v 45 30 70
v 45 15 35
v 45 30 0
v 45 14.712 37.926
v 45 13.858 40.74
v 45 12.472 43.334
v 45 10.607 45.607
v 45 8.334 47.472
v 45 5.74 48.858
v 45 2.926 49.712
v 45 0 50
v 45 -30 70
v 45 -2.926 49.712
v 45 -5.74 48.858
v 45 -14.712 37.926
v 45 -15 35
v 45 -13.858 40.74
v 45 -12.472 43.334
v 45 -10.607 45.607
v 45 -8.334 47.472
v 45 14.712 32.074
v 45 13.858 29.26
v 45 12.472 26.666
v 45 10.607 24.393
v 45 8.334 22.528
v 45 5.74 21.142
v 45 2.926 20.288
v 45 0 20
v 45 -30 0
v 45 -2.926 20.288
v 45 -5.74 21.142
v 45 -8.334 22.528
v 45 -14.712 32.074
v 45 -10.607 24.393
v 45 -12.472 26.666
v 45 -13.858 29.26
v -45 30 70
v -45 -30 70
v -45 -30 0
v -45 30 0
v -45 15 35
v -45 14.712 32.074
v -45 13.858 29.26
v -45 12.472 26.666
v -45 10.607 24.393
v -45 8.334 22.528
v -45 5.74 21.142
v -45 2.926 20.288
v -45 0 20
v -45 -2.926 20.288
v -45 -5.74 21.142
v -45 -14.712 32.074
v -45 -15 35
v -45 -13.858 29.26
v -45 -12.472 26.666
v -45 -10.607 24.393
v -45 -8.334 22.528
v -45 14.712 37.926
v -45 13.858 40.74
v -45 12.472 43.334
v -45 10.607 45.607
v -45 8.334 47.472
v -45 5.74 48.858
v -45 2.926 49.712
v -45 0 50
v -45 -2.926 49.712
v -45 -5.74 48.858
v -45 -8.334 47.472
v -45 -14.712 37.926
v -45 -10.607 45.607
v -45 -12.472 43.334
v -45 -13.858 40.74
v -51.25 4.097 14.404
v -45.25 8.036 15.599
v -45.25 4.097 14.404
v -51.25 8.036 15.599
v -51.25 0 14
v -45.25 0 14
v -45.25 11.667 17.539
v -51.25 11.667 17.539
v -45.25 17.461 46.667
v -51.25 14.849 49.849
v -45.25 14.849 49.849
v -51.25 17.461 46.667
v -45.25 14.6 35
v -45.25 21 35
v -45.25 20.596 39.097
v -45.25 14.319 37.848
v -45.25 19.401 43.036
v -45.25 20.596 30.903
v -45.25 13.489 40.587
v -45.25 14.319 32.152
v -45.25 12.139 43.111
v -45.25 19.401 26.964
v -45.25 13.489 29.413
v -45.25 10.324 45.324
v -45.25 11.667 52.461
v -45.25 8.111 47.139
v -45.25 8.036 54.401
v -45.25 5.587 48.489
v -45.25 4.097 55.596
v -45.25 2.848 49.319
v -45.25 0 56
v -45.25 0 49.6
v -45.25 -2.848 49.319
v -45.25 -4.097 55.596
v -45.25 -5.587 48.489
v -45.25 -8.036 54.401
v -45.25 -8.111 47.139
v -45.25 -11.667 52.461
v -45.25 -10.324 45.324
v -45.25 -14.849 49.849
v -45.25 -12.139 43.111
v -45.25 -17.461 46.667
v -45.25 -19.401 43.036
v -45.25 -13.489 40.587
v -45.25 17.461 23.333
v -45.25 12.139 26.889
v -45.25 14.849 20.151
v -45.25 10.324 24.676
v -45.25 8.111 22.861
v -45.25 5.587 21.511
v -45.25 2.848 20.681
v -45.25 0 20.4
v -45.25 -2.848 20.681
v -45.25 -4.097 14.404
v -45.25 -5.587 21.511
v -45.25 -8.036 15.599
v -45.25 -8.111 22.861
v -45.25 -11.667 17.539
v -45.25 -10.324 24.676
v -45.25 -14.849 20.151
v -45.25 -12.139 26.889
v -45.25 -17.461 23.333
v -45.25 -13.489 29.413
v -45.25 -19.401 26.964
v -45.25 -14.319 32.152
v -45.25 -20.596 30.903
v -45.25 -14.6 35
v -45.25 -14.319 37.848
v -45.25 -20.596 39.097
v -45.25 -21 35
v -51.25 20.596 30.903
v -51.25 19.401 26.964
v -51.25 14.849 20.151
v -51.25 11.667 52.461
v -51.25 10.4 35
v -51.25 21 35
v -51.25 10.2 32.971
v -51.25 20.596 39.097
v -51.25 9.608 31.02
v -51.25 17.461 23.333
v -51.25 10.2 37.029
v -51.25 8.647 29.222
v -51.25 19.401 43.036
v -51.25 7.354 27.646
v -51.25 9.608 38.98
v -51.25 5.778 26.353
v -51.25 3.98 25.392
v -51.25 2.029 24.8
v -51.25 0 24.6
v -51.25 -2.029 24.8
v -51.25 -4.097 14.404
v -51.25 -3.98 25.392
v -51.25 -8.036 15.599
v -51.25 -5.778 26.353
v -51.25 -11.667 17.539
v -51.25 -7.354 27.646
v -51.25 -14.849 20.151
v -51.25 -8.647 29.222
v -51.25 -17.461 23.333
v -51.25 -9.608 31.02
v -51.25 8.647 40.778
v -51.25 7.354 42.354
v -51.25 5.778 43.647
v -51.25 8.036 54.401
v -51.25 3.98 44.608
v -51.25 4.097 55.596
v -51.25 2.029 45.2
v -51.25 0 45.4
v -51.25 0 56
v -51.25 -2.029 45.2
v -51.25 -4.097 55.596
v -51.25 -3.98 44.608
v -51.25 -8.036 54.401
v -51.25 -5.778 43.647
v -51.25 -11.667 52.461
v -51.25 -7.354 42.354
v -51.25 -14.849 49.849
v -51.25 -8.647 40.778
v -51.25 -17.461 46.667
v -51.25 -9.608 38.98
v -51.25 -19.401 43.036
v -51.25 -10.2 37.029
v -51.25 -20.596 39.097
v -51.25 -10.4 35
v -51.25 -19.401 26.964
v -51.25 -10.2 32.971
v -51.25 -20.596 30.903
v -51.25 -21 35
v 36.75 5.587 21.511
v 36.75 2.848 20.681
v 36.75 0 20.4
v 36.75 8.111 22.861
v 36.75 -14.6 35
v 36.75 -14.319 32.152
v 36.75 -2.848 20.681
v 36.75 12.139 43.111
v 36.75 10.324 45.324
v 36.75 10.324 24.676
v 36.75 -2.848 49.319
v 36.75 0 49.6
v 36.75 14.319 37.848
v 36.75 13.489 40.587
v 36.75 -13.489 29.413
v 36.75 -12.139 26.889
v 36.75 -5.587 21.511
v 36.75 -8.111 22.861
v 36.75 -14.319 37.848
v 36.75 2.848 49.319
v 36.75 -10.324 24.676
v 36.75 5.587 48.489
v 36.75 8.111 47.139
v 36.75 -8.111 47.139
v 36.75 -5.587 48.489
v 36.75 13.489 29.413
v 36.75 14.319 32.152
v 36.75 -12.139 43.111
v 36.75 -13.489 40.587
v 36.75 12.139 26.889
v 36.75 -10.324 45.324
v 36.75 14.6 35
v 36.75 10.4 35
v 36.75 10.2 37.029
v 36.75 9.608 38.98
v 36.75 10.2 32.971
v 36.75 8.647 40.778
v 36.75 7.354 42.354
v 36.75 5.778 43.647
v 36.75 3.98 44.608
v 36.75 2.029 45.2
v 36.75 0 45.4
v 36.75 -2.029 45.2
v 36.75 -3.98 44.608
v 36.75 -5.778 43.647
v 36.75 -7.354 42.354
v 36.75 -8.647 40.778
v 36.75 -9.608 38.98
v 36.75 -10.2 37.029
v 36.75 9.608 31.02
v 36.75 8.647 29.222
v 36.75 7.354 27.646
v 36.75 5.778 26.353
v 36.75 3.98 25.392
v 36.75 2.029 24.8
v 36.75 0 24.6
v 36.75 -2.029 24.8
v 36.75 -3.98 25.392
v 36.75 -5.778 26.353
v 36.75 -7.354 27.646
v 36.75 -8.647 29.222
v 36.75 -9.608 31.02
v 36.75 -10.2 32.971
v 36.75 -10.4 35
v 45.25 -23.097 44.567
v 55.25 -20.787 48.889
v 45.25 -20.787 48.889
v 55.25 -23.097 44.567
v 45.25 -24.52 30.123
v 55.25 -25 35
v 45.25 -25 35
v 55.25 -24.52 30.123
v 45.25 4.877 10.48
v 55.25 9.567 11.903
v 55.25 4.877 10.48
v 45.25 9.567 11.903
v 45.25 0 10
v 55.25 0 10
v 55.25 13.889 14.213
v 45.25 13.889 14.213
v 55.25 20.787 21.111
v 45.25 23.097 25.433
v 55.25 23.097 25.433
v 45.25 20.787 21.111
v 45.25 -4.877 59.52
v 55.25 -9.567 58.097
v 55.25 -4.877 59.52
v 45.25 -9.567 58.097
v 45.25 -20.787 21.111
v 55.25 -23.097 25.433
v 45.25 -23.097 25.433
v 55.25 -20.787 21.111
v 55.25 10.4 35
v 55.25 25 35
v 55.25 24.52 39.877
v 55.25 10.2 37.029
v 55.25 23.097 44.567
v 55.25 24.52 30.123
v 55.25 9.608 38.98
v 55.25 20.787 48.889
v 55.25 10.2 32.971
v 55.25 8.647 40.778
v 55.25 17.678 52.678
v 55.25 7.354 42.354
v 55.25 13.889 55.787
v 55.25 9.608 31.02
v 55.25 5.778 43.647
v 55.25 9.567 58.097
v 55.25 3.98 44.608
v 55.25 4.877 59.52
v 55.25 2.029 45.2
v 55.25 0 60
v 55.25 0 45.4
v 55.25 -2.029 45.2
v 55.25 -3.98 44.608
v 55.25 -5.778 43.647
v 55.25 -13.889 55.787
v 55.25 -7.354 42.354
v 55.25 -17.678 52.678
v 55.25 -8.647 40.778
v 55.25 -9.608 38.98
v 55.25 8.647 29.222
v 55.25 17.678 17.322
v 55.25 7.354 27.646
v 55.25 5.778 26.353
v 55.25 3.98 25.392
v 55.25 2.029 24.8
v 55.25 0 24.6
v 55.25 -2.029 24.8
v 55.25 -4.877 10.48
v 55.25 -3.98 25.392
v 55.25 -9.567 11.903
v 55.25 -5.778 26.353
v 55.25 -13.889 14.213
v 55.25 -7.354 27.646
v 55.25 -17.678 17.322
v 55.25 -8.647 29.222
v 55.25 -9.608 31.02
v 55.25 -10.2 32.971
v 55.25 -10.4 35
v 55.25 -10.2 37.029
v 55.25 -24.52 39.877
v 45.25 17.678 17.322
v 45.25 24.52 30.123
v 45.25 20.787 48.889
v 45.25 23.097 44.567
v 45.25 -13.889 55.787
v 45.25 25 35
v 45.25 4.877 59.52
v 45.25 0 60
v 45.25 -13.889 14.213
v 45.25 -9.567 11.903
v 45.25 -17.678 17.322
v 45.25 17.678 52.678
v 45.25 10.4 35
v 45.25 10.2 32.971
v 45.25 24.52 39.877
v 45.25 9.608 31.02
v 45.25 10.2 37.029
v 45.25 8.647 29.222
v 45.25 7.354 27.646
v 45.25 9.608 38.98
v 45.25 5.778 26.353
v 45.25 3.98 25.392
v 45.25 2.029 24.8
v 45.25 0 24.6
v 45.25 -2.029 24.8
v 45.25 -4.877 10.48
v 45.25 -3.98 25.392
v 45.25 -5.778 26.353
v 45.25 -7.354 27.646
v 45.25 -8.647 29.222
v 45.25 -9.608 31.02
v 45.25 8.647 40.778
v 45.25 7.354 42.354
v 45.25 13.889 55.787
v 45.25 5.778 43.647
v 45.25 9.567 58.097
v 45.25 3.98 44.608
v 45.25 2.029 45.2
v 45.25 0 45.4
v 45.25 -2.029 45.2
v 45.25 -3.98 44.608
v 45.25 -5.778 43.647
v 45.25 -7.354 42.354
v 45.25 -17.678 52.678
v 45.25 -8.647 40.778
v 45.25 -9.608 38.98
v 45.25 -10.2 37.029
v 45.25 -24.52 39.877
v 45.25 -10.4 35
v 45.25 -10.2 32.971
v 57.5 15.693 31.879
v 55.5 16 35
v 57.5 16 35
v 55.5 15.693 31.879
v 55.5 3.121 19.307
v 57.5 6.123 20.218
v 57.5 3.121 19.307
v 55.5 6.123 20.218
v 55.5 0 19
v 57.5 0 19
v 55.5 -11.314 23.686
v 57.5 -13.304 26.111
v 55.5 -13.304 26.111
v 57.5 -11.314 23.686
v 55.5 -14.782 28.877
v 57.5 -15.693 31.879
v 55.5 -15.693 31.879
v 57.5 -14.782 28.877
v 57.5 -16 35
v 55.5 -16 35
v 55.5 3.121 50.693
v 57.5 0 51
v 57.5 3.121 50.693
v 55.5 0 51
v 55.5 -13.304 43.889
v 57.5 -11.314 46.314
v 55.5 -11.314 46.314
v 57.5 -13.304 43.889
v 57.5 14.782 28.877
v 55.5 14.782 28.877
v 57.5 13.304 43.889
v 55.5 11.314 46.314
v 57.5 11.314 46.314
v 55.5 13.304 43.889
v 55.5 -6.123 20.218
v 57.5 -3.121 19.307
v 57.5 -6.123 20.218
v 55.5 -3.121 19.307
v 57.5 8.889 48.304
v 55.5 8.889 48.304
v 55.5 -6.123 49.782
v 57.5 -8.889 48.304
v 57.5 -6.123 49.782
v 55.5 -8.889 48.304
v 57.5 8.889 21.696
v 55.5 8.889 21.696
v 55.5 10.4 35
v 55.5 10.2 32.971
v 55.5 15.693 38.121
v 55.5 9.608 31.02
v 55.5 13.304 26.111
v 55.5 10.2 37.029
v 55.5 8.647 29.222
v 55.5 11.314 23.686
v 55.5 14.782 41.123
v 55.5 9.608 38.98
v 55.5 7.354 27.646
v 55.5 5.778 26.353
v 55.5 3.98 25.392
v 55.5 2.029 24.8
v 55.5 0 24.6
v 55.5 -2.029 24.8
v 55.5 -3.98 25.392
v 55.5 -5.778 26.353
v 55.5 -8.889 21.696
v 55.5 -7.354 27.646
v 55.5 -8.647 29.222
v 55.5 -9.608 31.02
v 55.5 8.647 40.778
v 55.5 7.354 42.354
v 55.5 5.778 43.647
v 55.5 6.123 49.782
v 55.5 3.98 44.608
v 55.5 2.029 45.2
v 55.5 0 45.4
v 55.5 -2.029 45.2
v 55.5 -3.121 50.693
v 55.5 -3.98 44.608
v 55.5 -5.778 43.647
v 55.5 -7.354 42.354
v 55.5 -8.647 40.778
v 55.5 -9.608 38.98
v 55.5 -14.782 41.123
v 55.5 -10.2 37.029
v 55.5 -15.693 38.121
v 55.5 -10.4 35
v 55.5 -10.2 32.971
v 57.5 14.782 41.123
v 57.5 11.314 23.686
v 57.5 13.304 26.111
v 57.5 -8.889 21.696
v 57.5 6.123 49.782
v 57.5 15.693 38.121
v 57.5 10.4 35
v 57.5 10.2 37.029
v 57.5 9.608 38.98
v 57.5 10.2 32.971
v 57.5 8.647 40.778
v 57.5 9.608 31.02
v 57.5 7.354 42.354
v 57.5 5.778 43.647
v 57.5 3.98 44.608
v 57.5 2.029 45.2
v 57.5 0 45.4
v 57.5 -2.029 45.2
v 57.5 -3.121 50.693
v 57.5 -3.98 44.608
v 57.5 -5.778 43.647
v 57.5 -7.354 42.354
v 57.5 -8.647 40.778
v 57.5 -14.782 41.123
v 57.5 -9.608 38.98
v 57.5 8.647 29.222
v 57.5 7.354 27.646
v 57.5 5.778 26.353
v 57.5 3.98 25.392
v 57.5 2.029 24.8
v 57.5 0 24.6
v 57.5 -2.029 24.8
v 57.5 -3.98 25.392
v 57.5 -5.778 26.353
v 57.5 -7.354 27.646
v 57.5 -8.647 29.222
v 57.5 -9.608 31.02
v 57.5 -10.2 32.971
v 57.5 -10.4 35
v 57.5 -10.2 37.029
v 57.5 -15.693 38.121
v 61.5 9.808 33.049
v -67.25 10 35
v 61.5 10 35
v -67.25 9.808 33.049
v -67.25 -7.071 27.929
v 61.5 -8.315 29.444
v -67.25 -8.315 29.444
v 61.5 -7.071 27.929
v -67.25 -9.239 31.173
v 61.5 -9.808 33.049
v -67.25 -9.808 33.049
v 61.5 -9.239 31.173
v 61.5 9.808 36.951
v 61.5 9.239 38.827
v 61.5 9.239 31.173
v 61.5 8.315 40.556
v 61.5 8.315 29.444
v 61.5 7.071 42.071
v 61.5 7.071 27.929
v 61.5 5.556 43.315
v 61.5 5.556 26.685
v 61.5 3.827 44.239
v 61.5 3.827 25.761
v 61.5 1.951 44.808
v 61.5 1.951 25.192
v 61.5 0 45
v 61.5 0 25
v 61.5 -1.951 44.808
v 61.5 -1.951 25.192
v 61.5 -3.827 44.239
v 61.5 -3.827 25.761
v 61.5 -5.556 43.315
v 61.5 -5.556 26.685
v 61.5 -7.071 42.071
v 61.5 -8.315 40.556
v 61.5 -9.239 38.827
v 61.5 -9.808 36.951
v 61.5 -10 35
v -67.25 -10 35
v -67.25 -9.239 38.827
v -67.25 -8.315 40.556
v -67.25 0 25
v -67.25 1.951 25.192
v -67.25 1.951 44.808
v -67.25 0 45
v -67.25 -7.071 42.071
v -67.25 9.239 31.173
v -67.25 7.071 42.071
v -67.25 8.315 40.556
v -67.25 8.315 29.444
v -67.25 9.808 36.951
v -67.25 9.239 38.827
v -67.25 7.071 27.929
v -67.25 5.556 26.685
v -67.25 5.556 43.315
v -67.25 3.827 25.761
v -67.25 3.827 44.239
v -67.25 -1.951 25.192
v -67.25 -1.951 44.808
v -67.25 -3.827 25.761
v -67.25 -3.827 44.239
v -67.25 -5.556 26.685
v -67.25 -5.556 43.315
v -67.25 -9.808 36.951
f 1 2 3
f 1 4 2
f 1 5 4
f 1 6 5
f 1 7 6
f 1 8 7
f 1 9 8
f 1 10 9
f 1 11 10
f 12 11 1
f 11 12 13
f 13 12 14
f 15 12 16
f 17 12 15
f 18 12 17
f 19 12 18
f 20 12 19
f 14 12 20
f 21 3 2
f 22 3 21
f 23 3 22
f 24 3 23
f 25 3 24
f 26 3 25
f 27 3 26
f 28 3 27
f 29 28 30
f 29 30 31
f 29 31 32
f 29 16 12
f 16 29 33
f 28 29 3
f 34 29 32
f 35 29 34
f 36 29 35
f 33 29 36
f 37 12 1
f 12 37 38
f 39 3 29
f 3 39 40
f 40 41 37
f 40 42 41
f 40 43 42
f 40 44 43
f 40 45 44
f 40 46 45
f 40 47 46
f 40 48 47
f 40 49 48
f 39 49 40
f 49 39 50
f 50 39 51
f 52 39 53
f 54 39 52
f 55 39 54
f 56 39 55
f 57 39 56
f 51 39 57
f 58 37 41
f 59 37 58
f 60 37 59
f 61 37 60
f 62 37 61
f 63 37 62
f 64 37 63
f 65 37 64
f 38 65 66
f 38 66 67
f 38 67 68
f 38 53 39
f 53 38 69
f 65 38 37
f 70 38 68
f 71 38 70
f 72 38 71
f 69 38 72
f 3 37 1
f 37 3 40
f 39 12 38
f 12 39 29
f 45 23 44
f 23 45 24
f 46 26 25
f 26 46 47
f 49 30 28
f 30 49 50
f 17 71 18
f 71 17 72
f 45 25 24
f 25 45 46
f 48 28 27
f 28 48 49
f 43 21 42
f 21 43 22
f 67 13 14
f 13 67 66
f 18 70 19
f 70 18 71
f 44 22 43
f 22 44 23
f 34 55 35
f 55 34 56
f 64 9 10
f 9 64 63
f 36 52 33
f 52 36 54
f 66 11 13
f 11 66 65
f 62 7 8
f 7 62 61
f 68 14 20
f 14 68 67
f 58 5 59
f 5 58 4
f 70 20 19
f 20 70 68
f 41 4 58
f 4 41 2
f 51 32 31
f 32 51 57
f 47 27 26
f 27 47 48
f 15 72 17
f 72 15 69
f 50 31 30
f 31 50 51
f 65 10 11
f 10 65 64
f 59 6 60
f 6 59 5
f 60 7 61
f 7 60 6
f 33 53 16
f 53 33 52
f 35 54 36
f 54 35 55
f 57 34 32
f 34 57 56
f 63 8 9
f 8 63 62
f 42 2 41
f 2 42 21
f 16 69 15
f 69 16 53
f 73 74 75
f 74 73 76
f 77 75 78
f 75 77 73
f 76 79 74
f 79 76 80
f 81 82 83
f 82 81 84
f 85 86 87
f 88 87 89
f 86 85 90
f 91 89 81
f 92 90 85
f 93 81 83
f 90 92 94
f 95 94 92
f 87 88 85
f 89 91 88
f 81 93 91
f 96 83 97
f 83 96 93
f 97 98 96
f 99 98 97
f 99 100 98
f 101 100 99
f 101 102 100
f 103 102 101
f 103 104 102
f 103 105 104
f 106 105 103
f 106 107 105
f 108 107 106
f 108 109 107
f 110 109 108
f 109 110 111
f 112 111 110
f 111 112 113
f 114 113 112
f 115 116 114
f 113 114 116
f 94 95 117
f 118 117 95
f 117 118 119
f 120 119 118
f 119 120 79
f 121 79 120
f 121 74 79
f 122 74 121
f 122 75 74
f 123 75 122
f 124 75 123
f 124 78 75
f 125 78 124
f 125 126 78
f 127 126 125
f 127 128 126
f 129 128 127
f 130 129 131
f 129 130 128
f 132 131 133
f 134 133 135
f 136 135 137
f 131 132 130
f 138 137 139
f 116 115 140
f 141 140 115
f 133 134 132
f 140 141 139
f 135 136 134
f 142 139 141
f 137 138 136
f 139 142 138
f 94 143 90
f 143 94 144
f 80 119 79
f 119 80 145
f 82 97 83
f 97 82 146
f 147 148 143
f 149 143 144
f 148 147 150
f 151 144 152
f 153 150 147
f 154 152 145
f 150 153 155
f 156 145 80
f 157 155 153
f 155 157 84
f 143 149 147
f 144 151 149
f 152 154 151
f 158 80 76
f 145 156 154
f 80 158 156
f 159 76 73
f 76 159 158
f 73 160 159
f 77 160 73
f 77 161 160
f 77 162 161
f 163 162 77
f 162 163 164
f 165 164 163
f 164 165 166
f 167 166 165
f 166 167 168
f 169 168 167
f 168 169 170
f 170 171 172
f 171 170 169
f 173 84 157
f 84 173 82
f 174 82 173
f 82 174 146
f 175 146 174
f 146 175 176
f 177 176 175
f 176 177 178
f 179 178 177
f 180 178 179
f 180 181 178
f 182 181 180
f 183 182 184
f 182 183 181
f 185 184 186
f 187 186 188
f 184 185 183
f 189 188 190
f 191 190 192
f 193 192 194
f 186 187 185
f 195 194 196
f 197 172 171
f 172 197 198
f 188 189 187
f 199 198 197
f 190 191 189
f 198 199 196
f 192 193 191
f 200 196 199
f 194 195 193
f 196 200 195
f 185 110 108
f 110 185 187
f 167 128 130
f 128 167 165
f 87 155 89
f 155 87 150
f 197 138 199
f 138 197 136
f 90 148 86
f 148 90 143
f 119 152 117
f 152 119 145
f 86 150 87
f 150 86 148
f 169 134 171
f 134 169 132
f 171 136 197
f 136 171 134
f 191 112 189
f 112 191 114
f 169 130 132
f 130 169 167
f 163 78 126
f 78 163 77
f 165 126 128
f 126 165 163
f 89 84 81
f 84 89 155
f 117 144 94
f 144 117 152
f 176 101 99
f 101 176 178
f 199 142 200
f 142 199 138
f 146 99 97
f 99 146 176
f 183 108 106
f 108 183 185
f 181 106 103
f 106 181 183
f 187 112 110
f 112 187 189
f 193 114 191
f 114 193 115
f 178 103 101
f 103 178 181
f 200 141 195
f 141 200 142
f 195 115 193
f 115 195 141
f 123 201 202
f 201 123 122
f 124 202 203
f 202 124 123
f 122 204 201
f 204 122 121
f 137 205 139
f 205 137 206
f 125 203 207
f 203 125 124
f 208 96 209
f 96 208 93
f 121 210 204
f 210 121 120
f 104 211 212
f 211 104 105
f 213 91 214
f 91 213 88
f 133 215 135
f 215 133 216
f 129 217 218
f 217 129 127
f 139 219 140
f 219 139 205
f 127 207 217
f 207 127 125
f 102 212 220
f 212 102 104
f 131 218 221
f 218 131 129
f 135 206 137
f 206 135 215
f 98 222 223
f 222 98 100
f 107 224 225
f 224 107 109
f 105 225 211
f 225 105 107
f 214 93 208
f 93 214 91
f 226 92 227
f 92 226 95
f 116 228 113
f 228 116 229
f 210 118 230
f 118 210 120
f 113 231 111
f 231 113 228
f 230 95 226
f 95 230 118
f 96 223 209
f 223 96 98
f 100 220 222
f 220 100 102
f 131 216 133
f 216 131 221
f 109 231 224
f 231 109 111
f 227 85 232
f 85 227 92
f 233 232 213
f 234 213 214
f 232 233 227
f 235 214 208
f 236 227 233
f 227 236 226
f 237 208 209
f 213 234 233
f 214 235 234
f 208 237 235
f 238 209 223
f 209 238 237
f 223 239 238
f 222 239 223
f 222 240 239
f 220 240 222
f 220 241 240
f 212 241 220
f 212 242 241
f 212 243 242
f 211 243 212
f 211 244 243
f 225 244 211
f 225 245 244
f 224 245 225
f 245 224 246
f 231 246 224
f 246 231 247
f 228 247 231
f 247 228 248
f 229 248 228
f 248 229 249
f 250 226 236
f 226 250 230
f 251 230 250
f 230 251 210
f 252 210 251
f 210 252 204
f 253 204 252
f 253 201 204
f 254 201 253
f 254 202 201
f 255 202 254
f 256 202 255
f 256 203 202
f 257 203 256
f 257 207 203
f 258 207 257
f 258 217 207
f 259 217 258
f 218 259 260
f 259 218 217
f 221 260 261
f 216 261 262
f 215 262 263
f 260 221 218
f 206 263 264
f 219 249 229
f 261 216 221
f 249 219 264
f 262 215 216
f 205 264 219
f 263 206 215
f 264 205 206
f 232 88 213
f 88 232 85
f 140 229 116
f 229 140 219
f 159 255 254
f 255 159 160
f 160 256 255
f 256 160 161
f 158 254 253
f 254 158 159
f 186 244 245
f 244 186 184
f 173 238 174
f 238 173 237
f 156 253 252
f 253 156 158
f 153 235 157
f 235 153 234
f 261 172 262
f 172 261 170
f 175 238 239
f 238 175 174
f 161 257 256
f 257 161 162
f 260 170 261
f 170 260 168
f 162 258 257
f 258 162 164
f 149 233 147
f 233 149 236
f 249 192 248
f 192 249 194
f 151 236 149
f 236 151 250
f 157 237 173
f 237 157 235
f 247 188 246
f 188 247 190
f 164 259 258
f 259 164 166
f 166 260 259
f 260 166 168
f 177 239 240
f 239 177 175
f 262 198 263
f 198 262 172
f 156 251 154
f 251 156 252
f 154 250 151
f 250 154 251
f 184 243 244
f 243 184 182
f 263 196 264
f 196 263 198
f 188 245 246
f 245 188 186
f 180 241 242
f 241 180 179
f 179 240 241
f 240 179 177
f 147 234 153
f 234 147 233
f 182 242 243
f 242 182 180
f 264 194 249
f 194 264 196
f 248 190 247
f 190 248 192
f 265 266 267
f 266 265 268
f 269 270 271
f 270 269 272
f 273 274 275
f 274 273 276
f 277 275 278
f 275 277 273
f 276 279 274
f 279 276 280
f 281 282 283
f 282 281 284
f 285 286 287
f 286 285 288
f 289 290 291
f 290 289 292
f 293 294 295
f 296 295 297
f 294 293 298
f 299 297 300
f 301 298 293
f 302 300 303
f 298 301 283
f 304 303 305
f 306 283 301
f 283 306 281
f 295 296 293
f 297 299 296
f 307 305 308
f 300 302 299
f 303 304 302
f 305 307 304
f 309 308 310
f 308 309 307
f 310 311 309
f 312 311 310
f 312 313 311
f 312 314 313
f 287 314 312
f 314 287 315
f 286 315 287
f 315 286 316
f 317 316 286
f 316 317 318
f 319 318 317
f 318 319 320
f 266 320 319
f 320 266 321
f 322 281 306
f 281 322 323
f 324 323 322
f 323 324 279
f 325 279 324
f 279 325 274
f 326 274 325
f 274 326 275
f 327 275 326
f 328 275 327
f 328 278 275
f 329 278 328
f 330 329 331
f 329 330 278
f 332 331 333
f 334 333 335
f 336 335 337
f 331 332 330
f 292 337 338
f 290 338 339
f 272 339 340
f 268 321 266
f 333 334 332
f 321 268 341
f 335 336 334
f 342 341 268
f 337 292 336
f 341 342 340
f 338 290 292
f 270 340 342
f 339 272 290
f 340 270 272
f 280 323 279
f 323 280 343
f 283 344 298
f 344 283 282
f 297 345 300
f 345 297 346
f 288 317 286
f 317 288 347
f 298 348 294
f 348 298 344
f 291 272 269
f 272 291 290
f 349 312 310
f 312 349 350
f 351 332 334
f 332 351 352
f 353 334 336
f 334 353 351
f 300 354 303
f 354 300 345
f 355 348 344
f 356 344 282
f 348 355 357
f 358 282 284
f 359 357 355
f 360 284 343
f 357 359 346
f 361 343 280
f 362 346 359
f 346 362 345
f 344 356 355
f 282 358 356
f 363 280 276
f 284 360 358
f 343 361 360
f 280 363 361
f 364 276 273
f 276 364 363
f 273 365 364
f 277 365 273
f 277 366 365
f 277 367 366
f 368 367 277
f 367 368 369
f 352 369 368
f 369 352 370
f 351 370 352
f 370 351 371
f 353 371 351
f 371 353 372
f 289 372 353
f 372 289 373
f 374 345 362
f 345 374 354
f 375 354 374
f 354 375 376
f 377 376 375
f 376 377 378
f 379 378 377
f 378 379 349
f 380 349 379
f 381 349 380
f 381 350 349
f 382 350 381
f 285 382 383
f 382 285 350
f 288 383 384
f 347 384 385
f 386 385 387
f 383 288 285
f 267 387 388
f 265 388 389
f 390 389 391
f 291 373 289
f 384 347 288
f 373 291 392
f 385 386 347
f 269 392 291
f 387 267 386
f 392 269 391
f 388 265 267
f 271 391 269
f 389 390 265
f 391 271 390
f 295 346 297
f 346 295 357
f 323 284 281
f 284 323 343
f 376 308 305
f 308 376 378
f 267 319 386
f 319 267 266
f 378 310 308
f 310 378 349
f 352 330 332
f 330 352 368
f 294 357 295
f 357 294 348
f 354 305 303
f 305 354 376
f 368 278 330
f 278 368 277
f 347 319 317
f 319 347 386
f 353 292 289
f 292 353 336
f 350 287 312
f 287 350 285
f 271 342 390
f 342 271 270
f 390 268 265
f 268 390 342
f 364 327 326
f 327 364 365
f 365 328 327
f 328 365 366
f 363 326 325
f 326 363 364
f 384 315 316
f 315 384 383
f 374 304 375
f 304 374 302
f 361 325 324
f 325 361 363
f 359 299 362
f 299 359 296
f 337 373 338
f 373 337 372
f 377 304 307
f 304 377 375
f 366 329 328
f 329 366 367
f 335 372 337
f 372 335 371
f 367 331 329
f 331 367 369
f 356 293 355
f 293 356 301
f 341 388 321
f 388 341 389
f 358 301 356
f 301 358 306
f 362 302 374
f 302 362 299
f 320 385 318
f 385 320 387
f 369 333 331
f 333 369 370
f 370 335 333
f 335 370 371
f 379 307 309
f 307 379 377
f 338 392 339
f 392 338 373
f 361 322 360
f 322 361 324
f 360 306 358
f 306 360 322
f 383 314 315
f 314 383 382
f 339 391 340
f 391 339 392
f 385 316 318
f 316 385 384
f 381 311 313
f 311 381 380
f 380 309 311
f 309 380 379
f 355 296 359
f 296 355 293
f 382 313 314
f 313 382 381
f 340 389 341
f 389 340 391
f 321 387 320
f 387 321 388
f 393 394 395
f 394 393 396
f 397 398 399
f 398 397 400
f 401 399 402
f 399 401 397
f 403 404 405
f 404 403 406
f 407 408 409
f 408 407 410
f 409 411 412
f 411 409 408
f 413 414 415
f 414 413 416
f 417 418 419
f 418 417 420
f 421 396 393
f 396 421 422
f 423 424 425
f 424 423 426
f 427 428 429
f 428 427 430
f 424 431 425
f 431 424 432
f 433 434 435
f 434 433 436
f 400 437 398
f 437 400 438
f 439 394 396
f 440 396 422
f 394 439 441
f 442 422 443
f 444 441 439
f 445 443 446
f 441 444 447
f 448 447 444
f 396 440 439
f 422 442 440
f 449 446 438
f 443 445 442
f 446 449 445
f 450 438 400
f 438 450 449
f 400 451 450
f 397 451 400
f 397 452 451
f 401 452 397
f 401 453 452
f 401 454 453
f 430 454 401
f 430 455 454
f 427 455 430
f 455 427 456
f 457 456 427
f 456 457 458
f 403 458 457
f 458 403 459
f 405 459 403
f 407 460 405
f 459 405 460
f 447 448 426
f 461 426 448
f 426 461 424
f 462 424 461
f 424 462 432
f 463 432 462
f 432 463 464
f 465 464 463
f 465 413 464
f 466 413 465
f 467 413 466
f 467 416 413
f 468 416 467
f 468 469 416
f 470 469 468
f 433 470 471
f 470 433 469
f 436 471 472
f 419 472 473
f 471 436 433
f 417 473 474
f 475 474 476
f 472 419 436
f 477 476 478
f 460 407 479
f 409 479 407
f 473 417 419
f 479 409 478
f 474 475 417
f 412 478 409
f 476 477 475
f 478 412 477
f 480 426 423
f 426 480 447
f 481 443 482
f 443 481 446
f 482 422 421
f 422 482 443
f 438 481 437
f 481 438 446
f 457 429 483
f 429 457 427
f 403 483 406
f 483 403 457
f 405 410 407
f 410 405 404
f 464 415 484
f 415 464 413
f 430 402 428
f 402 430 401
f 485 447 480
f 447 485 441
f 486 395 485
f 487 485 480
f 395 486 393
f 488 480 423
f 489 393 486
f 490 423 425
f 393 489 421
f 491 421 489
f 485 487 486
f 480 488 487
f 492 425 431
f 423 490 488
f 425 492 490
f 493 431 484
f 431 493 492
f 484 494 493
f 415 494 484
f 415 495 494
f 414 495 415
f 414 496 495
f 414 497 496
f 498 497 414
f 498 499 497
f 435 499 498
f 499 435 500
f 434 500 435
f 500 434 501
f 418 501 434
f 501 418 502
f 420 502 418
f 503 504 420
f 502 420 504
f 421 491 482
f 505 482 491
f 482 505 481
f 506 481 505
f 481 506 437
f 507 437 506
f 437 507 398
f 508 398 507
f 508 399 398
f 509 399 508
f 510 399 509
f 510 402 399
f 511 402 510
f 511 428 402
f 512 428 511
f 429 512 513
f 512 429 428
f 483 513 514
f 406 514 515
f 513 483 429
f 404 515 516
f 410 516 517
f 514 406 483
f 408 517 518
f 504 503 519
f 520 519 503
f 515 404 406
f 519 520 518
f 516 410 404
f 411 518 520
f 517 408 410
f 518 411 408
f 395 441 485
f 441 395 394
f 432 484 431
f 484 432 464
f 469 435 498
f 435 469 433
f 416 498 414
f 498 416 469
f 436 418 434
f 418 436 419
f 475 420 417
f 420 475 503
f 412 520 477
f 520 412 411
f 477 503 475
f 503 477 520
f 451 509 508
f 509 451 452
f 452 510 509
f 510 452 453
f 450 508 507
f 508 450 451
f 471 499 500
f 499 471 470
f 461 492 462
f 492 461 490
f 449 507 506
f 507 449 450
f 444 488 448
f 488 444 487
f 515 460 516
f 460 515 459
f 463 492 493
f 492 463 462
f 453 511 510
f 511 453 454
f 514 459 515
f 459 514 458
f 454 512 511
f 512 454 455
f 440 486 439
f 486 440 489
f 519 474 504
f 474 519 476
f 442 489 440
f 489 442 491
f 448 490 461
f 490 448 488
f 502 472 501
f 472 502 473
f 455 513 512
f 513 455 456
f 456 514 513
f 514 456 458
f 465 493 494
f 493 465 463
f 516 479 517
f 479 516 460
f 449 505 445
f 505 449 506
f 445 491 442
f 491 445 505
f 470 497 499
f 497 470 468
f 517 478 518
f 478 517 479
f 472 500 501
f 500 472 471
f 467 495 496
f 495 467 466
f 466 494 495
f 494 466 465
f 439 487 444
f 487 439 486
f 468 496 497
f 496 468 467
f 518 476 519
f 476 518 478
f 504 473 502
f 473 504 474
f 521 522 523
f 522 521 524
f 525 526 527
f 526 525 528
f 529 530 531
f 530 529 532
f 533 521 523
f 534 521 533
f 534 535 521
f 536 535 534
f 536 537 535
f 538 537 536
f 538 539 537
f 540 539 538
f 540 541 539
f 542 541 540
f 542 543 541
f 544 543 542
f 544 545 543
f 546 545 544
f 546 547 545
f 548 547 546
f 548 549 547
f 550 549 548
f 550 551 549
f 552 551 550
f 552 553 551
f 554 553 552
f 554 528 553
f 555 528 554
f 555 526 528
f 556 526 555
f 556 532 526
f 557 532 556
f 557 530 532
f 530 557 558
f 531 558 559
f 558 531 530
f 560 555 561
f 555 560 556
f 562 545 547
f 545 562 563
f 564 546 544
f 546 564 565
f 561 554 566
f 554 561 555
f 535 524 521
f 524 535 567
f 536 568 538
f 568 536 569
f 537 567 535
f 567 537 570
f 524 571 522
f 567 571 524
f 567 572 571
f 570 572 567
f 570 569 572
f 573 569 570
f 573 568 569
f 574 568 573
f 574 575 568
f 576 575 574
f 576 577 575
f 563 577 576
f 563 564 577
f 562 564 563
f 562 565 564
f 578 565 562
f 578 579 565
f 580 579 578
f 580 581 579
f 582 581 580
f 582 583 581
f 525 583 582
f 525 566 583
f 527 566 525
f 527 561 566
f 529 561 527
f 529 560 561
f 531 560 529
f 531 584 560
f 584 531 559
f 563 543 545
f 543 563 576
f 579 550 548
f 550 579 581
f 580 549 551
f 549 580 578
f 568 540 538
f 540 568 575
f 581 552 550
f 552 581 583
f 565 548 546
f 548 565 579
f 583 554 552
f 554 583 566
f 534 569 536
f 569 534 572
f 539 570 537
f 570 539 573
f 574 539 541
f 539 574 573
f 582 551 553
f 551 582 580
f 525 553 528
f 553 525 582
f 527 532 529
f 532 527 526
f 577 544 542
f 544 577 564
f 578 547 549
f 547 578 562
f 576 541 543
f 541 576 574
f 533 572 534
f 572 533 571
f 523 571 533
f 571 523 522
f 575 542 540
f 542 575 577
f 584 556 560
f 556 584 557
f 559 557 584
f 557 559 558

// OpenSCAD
$fn = 32;

// ------------------------------------------------------------------------
// Bushed housing: 90 x 60 x 70 mm housing, bushing d29.2
// Every part is its own module, assembly() places them once.
// ------------------------------------------------------------------------

// --- part 1 ---
module housing() {
  difference() {
    translate([-45, -30, 0]) cube([90, 60, 70]);
    translate([0, 0, 35]) rotate([0, 90, 0]) cylinder(h = 92, d = 30, center = true);
  }
}

// --- part 2 ---
module bushing() {
  difference() {
    union() {
      cylinder(h = 6, d = 42);
      translate([0, 0, 6]) cylinder(h = 82, d = 29.2);
    }
    translate([0, 0, -1]) cylinder(h = 90, d = 20.8);
  }
}

// --- part 3 ---
module shaft() {
  translate([0, 0, -64.375]) cylinder(h = 128.75, d = 20);
}

// --- part 4 ---
module cover() {
  difference() {
    cylinder(h = 10, d = 50);
    translate([0, 0, -1]) cylinder(h = 12, d = 20.8);
  }
}

// --- part 5 ---
module washer() {
  difference() {
      translate([0, 0, 0]) cylinder(h = 2, d = 32);
      translate([0, 0, -1]) cylinder(h = 4, d = 20.8);
    }
}

// --- assembly ---
module assembly() {
  translate([0, 0, 0]) rotate([0, 0, 0]) housing();
  translate([-51.25, 0, 35]) rotate([0, 90, 0]) bushing();
  translate([-2.875, 0, 35]) rotate([0, 90, 0]) shaft();
  translate([45.25, 0, 35]) rotate([0, 90, 0]) cover();
  translate([55.5, 0, 35]) rotate([0, 90, 0]) washer();
}

assembly();
